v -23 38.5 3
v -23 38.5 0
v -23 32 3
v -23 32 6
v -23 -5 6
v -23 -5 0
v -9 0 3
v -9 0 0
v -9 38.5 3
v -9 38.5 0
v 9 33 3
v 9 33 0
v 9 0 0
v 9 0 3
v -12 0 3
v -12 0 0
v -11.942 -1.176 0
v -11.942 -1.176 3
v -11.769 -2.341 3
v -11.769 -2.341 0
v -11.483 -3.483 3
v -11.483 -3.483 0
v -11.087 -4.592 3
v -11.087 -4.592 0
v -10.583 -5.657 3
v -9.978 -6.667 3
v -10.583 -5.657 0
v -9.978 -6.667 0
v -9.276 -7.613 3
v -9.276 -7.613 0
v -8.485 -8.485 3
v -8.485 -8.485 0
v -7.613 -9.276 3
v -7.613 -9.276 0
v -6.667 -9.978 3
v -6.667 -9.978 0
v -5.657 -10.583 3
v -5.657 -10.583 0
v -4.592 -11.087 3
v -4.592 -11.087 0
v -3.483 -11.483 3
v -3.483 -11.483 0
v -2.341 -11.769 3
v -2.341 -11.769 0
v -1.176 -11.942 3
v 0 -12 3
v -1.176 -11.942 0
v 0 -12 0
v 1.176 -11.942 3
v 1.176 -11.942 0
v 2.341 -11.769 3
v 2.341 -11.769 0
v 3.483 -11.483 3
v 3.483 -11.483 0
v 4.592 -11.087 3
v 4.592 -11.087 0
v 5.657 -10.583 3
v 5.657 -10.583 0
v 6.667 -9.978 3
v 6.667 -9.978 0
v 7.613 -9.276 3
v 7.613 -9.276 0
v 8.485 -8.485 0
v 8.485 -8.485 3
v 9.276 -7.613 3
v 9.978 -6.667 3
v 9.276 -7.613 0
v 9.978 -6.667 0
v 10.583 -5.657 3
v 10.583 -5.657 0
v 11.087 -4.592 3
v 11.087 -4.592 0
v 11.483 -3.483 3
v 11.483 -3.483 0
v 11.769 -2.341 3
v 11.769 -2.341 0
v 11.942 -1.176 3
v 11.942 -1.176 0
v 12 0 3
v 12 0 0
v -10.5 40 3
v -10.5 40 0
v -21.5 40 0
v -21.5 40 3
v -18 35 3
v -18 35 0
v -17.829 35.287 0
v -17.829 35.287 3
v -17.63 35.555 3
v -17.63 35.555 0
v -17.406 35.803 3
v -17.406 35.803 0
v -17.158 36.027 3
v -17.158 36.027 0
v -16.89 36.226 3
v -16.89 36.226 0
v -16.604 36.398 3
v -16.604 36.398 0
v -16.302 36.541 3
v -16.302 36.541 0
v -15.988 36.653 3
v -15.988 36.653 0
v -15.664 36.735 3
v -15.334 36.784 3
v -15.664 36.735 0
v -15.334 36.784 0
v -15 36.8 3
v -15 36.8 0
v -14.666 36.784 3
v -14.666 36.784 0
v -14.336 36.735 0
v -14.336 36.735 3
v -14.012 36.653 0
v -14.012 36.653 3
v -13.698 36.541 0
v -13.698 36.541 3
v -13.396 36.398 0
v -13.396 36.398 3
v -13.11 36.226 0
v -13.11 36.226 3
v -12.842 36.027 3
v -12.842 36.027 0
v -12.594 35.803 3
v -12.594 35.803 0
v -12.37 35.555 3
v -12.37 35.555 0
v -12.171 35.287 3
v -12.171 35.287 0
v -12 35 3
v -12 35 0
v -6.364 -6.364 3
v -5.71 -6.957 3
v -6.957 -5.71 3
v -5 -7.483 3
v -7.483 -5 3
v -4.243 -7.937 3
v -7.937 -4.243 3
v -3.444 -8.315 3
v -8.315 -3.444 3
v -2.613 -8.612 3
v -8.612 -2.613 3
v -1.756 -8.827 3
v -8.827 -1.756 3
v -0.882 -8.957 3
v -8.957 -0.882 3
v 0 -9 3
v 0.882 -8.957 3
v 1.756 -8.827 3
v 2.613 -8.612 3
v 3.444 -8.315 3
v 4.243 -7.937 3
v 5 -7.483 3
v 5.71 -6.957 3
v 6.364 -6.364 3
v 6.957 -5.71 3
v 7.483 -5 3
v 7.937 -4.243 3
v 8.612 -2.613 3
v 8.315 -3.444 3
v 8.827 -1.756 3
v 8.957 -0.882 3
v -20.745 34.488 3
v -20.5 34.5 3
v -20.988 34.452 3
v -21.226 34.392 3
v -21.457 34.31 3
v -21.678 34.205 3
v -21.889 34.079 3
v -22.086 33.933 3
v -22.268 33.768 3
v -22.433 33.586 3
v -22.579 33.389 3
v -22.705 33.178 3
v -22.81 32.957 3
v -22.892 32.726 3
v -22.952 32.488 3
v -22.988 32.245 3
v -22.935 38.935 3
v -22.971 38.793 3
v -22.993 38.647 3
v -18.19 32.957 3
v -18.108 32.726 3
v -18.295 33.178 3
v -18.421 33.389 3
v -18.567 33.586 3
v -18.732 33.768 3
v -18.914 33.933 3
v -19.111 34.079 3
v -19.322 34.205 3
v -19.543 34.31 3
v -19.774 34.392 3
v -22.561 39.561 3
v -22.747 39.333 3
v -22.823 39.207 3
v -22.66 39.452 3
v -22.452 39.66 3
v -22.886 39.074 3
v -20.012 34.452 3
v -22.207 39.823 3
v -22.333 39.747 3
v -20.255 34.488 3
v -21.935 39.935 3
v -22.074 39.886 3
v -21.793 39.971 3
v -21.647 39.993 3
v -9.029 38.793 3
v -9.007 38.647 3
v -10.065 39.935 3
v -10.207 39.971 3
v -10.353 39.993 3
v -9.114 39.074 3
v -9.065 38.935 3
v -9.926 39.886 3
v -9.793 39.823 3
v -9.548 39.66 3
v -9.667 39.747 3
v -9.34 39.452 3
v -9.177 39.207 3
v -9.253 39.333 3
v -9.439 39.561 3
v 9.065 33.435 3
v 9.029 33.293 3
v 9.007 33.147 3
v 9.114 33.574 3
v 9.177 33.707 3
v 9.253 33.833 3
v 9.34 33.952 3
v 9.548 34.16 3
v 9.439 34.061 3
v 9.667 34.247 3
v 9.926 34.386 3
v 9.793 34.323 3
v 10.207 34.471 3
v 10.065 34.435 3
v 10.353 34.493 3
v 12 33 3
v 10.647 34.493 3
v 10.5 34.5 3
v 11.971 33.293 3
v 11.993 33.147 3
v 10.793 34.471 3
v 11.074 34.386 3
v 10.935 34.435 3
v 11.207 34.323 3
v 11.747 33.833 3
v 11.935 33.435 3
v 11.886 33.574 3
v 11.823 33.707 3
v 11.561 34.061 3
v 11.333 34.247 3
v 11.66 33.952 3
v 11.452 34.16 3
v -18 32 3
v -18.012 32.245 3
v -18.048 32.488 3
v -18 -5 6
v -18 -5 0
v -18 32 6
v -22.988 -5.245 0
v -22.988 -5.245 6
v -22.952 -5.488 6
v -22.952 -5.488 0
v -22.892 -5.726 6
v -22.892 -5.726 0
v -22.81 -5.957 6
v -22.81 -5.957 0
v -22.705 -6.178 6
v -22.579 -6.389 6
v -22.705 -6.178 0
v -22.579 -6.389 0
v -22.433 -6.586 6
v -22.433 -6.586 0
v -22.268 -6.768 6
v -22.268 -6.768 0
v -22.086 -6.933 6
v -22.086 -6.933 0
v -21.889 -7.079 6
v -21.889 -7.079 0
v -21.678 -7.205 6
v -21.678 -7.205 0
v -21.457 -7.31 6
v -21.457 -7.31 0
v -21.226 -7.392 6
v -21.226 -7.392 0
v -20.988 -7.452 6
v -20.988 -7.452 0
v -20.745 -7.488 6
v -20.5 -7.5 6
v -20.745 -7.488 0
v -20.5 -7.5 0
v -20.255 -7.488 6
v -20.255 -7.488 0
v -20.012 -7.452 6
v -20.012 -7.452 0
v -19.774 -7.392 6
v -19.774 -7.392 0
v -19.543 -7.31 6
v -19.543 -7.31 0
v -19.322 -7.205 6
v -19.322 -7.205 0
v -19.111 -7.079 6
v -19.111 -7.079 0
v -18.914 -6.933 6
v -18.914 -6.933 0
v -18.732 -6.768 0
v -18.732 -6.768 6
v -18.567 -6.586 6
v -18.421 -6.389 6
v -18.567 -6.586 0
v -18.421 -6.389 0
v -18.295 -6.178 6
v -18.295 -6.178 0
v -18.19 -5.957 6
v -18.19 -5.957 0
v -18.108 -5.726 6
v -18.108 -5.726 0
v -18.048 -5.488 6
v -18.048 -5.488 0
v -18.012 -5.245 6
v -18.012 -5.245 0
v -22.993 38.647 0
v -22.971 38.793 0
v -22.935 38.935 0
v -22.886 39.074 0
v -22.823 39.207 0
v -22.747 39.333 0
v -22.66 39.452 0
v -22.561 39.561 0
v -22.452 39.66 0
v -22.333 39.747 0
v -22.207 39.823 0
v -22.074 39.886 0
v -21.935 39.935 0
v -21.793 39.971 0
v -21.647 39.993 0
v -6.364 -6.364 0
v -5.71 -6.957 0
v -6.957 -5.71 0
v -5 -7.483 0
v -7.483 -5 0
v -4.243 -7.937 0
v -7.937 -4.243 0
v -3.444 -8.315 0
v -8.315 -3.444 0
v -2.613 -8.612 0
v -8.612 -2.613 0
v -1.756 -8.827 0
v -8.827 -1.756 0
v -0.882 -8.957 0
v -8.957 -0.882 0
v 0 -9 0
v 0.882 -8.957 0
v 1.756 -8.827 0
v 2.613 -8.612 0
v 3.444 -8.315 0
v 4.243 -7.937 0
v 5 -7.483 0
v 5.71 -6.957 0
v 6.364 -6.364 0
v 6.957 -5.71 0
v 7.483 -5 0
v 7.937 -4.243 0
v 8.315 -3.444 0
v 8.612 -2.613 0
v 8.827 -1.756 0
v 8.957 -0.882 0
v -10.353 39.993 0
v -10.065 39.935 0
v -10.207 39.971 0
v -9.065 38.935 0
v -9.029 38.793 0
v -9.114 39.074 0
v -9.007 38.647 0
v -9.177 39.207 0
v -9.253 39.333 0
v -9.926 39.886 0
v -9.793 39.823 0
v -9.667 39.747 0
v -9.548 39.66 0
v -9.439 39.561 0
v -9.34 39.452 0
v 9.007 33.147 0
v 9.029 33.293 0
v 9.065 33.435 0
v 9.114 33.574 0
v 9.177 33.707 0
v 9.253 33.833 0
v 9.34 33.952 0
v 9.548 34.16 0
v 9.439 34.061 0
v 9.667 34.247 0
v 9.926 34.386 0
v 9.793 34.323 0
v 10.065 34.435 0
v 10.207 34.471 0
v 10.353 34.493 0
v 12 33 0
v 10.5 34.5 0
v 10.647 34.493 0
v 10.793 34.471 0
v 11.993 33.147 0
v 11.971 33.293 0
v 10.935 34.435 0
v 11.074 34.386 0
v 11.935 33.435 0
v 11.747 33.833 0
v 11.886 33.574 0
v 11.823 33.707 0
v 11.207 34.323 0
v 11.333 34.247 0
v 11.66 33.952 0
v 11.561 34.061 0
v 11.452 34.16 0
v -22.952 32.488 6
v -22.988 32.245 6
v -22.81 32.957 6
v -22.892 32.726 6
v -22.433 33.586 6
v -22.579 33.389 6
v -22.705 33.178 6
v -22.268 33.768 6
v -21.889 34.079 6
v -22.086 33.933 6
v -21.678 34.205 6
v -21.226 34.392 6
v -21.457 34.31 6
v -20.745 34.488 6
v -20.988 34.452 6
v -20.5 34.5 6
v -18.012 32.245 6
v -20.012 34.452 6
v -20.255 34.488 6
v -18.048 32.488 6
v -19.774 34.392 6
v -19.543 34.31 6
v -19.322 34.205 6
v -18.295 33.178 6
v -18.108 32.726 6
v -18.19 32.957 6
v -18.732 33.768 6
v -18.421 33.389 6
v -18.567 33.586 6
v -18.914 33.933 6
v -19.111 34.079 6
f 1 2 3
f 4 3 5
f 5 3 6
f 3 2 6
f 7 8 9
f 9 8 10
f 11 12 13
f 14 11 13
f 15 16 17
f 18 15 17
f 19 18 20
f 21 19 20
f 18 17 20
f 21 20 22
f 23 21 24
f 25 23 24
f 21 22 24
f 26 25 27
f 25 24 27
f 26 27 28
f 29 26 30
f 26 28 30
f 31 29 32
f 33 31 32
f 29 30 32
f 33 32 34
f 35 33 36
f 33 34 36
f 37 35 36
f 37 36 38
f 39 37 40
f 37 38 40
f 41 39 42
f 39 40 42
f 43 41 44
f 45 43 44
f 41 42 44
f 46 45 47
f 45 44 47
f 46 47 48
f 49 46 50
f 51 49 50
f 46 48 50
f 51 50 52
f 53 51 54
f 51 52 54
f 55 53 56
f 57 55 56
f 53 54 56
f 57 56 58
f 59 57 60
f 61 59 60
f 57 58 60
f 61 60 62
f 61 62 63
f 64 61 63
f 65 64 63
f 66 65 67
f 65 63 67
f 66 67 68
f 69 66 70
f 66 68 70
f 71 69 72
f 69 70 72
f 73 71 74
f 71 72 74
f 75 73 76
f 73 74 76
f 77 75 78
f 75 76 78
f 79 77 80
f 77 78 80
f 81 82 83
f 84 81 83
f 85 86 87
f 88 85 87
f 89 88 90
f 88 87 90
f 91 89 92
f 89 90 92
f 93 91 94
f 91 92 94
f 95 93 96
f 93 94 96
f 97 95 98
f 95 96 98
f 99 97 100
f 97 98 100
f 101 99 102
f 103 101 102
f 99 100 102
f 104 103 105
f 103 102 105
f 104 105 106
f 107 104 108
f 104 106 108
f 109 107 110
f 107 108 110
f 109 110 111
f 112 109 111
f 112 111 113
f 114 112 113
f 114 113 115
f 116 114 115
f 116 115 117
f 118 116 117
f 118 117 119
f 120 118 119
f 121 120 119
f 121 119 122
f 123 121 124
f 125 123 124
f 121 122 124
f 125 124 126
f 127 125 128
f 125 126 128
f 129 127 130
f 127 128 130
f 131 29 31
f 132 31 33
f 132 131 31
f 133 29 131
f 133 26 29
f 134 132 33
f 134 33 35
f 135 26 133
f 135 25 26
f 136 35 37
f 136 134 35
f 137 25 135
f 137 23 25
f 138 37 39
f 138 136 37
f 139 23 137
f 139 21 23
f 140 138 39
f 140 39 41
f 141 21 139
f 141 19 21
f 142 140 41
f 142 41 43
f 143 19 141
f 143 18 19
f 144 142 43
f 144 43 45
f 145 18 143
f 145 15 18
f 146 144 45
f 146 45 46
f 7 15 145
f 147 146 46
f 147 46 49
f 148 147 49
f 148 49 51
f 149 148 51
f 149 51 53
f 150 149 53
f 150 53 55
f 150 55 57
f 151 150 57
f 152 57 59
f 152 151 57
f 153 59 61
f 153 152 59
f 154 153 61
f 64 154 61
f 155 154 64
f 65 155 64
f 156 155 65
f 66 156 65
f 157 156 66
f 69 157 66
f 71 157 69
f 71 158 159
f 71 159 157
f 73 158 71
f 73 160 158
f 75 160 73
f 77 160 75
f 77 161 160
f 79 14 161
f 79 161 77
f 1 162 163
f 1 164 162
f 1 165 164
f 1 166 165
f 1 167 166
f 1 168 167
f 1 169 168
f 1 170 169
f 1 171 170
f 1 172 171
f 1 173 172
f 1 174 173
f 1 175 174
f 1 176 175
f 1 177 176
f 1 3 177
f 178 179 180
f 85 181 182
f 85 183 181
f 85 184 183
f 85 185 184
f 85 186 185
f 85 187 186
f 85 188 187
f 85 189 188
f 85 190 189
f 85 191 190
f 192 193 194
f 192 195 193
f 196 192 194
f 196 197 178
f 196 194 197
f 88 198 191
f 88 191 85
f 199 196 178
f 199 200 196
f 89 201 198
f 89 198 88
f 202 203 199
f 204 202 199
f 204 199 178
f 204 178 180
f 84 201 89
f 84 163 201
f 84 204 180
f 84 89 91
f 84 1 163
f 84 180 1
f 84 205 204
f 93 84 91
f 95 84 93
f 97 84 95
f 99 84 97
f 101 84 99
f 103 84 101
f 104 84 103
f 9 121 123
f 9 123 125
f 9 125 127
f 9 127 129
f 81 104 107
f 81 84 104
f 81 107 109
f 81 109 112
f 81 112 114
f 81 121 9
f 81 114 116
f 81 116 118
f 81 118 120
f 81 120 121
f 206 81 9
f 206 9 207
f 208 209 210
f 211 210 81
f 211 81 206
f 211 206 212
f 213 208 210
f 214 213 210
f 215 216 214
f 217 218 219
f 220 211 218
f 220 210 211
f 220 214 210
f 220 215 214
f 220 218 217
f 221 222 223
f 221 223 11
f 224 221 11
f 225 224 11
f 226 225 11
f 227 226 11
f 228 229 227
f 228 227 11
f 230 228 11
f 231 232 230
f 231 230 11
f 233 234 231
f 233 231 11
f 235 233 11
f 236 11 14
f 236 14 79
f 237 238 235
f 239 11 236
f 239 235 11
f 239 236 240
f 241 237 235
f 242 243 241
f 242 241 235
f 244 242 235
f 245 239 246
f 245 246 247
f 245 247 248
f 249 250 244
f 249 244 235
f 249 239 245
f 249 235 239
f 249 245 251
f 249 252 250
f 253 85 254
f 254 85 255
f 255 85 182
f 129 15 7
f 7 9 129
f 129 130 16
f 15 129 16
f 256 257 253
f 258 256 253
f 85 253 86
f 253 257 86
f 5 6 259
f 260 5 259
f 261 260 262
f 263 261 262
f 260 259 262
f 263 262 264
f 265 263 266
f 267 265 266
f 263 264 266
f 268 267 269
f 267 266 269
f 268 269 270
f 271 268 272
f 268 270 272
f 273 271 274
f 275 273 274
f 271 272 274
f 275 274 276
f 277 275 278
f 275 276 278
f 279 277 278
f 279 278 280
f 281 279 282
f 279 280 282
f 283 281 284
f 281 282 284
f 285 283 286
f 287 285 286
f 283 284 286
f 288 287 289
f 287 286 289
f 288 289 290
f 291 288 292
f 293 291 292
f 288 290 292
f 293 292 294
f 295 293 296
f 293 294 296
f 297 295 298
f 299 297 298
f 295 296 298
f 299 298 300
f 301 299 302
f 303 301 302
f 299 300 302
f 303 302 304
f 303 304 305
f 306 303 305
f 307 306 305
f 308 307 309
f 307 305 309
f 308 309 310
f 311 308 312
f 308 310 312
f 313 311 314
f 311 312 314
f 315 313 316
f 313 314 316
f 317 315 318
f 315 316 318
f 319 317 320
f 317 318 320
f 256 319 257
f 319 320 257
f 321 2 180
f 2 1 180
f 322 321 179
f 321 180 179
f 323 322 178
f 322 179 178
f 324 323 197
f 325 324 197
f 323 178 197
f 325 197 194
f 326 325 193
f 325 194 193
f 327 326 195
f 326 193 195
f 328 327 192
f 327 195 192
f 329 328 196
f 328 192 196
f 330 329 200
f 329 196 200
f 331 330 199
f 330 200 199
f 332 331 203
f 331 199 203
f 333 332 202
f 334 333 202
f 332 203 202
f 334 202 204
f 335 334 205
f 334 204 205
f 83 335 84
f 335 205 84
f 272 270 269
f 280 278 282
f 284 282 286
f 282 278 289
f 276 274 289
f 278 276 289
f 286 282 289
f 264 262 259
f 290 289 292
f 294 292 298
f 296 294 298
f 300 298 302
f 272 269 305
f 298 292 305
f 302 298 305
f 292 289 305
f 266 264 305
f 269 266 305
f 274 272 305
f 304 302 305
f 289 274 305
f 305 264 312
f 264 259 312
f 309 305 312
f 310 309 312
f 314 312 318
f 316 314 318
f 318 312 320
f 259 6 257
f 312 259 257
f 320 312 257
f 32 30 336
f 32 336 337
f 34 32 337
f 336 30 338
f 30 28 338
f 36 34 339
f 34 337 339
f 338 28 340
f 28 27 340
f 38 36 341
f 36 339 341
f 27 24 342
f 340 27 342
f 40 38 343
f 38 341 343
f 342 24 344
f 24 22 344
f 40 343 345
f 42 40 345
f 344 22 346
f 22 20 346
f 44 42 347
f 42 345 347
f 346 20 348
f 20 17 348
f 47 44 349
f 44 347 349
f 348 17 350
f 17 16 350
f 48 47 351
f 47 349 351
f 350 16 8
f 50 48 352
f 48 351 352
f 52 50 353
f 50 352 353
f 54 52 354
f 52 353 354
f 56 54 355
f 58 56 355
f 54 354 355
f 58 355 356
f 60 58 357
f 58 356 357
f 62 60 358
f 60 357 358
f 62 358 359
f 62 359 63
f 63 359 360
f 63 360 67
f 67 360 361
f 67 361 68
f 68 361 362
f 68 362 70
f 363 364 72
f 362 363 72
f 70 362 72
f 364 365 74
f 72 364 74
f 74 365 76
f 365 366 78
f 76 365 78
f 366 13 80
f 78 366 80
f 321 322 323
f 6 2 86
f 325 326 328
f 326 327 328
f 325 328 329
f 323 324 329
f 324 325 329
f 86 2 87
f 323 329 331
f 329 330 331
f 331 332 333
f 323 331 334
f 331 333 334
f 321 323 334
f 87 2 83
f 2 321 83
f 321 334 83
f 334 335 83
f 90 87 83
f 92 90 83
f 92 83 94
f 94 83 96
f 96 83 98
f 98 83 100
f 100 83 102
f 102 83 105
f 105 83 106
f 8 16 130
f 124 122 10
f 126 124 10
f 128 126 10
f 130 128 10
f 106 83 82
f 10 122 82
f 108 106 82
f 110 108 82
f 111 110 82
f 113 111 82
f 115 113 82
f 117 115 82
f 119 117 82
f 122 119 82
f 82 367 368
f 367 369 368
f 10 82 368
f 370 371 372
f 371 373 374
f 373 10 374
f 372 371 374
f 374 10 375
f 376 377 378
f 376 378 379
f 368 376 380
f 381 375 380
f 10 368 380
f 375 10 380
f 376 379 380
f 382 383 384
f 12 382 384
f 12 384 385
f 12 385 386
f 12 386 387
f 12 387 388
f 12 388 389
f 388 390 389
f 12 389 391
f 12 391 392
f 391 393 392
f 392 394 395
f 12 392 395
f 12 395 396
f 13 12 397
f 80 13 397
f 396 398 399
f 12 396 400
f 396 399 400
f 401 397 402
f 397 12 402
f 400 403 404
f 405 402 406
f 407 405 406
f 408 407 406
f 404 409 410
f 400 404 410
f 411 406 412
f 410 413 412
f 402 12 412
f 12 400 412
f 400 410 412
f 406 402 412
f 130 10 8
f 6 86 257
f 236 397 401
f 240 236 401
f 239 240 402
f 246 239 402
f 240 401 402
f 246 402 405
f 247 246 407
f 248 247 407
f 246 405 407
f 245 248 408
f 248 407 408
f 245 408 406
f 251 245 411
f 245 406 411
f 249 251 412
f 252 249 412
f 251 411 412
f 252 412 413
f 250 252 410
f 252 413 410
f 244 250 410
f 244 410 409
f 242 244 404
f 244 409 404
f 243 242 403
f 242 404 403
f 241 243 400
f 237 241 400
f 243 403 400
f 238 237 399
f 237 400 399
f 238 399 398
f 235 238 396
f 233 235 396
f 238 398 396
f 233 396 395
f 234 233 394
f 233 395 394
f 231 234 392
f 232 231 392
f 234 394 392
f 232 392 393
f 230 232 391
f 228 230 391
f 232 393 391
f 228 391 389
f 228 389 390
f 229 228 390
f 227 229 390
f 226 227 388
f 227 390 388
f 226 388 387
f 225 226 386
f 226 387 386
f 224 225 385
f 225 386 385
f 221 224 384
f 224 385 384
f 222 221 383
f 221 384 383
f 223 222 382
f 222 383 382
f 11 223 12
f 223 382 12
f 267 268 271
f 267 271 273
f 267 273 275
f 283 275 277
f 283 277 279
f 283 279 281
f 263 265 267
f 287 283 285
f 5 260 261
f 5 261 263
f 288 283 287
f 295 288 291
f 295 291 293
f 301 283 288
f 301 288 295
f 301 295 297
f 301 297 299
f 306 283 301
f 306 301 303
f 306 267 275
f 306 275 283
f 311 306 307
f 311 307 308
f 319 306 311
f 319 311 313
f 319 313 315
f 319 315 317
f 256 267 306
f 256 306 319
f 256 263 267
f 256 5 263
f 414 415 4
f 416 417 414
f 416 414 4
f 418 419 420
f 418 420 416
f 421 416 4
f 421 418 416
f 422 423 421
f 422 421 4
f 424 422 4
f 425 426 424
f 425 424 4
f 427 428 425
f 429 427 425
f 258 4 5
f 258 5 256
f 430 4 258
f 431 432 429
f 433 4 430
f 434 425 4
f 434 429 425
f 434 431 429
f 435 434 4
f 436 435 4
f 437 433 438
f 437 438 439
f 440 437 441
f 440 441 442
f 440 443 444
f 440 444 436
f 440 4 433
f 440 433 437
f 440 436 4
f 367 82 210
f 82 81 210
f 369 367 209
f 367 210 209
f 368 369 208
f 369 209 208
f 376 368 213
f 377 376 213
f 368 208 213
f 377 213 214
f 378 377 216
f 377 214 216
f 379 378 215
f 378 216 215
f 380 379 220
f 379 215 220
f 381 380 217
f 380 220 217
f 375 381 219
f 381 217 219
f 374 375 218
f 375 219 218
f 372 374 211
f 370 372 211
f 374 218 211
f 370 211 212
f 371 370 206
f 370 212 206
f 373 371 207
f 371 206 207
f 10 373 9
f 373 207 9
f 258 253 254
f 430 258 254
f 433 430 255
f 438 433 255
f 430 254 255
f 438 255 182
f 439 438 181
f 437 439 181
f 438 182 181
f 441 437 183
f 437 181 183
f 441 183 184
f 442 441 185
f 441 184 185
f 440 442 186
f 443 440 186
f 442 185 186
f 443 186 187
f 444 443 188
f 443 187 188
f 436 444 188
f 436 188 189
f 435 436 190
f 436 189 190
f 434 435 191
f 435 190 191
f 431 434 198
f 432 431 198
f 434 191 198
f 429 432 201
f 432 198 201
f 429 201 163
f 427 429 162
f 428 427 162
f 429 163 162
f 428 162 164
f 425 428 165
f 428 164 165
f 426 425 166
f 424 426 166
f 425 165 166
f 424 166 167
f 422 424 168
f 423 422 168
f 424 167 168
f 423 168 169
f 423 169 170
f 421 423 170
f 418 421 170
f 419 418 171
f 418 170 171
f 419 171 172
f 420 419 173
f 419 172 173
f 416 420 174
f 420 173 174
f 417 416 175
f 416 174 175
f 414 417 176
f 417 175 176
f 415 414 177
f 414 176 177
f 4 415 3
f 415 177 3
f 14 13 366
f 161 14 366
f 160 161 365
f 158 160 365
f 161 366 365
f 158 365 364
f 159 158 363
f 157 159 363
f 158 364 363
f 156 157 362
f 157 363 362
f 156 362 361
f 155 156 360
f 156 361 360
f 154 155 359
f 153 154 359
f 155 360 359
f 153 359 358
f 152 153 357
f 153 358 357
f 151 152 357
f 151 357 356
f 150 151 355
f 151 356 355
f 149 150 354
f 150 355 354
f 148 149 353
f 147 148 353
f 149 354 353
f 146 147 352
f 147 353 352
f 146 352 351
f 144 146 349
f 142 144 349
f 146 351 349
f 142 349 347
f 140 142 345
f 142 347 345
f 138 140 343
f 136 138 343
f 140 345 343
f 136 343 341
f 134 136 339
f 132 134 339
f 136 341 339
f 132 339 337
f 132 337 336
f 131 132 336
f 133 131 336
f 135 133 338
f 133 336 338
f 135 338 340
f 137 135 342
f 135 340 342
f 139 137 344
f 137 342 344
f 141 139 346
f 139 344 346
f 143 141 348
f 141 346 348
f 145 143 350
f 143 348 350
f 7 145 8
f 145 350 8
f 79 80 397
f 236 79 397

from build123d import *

# Parameters (mm, degrees)
F1_DEPTH = 3
F3_DEPTH = 3
F4_R     = 1.5


with BuildPart() as f1:
    # F0 (on Top) → F1 (new body)
    with BuildSketch(Plane.XY):
        with BuildLine():
            ThreePointArc((9, 0), (0, -9), (-9, 0))
            Line((-9, 0), (-9, 40))
            Line((-9, 40), (-23, 40))
            Line((-23, 40), (-23, -5))
            ThreePointArc((-23, -5), (-20.5, -7.5), (-18, -5))
            Line((-18, -5), (-18, 35))
            ThreePointArc((-18, 35), (-15, 36.8), (-12, 35))
            Line((-12, 35), (-12, 0))
            ThreePointArc((-12, 0), (0, -12), (12, 0))
            Line((12, 0), (12, 33))
            ThreePointArc((12, 33), (10.5, 34.5), (9, 33))
            Line((9, 33), (9, 0))
        make_face()
    extrude(amount=F1_DEPTH)

    # F2 (on face) → F3 (join)
    with BuildSketch(Plane.XY.offset(3)):
        with BuildLine():
            Line((-18, -5), (-18, 32))
            ThreePointArc((-18, 32), (-20.5, 34.5), (-23, 32))
            Line((-23, 32), (-23, -5))
            ThreePointArc((-23, -5), (-20.5, -7.5), (-18, -5))
        make_face()
    extrude(amount=F3_DEPTH)

    # F4
    f4_edges = [f1.edges().sort_by_distance(p)[0] for p in [
        (-23, 40, 1.5),
        (-9, 40, 1.5),
    ]]
    fillet(f4_edges, radius=F4_R)


solid = f1.part
